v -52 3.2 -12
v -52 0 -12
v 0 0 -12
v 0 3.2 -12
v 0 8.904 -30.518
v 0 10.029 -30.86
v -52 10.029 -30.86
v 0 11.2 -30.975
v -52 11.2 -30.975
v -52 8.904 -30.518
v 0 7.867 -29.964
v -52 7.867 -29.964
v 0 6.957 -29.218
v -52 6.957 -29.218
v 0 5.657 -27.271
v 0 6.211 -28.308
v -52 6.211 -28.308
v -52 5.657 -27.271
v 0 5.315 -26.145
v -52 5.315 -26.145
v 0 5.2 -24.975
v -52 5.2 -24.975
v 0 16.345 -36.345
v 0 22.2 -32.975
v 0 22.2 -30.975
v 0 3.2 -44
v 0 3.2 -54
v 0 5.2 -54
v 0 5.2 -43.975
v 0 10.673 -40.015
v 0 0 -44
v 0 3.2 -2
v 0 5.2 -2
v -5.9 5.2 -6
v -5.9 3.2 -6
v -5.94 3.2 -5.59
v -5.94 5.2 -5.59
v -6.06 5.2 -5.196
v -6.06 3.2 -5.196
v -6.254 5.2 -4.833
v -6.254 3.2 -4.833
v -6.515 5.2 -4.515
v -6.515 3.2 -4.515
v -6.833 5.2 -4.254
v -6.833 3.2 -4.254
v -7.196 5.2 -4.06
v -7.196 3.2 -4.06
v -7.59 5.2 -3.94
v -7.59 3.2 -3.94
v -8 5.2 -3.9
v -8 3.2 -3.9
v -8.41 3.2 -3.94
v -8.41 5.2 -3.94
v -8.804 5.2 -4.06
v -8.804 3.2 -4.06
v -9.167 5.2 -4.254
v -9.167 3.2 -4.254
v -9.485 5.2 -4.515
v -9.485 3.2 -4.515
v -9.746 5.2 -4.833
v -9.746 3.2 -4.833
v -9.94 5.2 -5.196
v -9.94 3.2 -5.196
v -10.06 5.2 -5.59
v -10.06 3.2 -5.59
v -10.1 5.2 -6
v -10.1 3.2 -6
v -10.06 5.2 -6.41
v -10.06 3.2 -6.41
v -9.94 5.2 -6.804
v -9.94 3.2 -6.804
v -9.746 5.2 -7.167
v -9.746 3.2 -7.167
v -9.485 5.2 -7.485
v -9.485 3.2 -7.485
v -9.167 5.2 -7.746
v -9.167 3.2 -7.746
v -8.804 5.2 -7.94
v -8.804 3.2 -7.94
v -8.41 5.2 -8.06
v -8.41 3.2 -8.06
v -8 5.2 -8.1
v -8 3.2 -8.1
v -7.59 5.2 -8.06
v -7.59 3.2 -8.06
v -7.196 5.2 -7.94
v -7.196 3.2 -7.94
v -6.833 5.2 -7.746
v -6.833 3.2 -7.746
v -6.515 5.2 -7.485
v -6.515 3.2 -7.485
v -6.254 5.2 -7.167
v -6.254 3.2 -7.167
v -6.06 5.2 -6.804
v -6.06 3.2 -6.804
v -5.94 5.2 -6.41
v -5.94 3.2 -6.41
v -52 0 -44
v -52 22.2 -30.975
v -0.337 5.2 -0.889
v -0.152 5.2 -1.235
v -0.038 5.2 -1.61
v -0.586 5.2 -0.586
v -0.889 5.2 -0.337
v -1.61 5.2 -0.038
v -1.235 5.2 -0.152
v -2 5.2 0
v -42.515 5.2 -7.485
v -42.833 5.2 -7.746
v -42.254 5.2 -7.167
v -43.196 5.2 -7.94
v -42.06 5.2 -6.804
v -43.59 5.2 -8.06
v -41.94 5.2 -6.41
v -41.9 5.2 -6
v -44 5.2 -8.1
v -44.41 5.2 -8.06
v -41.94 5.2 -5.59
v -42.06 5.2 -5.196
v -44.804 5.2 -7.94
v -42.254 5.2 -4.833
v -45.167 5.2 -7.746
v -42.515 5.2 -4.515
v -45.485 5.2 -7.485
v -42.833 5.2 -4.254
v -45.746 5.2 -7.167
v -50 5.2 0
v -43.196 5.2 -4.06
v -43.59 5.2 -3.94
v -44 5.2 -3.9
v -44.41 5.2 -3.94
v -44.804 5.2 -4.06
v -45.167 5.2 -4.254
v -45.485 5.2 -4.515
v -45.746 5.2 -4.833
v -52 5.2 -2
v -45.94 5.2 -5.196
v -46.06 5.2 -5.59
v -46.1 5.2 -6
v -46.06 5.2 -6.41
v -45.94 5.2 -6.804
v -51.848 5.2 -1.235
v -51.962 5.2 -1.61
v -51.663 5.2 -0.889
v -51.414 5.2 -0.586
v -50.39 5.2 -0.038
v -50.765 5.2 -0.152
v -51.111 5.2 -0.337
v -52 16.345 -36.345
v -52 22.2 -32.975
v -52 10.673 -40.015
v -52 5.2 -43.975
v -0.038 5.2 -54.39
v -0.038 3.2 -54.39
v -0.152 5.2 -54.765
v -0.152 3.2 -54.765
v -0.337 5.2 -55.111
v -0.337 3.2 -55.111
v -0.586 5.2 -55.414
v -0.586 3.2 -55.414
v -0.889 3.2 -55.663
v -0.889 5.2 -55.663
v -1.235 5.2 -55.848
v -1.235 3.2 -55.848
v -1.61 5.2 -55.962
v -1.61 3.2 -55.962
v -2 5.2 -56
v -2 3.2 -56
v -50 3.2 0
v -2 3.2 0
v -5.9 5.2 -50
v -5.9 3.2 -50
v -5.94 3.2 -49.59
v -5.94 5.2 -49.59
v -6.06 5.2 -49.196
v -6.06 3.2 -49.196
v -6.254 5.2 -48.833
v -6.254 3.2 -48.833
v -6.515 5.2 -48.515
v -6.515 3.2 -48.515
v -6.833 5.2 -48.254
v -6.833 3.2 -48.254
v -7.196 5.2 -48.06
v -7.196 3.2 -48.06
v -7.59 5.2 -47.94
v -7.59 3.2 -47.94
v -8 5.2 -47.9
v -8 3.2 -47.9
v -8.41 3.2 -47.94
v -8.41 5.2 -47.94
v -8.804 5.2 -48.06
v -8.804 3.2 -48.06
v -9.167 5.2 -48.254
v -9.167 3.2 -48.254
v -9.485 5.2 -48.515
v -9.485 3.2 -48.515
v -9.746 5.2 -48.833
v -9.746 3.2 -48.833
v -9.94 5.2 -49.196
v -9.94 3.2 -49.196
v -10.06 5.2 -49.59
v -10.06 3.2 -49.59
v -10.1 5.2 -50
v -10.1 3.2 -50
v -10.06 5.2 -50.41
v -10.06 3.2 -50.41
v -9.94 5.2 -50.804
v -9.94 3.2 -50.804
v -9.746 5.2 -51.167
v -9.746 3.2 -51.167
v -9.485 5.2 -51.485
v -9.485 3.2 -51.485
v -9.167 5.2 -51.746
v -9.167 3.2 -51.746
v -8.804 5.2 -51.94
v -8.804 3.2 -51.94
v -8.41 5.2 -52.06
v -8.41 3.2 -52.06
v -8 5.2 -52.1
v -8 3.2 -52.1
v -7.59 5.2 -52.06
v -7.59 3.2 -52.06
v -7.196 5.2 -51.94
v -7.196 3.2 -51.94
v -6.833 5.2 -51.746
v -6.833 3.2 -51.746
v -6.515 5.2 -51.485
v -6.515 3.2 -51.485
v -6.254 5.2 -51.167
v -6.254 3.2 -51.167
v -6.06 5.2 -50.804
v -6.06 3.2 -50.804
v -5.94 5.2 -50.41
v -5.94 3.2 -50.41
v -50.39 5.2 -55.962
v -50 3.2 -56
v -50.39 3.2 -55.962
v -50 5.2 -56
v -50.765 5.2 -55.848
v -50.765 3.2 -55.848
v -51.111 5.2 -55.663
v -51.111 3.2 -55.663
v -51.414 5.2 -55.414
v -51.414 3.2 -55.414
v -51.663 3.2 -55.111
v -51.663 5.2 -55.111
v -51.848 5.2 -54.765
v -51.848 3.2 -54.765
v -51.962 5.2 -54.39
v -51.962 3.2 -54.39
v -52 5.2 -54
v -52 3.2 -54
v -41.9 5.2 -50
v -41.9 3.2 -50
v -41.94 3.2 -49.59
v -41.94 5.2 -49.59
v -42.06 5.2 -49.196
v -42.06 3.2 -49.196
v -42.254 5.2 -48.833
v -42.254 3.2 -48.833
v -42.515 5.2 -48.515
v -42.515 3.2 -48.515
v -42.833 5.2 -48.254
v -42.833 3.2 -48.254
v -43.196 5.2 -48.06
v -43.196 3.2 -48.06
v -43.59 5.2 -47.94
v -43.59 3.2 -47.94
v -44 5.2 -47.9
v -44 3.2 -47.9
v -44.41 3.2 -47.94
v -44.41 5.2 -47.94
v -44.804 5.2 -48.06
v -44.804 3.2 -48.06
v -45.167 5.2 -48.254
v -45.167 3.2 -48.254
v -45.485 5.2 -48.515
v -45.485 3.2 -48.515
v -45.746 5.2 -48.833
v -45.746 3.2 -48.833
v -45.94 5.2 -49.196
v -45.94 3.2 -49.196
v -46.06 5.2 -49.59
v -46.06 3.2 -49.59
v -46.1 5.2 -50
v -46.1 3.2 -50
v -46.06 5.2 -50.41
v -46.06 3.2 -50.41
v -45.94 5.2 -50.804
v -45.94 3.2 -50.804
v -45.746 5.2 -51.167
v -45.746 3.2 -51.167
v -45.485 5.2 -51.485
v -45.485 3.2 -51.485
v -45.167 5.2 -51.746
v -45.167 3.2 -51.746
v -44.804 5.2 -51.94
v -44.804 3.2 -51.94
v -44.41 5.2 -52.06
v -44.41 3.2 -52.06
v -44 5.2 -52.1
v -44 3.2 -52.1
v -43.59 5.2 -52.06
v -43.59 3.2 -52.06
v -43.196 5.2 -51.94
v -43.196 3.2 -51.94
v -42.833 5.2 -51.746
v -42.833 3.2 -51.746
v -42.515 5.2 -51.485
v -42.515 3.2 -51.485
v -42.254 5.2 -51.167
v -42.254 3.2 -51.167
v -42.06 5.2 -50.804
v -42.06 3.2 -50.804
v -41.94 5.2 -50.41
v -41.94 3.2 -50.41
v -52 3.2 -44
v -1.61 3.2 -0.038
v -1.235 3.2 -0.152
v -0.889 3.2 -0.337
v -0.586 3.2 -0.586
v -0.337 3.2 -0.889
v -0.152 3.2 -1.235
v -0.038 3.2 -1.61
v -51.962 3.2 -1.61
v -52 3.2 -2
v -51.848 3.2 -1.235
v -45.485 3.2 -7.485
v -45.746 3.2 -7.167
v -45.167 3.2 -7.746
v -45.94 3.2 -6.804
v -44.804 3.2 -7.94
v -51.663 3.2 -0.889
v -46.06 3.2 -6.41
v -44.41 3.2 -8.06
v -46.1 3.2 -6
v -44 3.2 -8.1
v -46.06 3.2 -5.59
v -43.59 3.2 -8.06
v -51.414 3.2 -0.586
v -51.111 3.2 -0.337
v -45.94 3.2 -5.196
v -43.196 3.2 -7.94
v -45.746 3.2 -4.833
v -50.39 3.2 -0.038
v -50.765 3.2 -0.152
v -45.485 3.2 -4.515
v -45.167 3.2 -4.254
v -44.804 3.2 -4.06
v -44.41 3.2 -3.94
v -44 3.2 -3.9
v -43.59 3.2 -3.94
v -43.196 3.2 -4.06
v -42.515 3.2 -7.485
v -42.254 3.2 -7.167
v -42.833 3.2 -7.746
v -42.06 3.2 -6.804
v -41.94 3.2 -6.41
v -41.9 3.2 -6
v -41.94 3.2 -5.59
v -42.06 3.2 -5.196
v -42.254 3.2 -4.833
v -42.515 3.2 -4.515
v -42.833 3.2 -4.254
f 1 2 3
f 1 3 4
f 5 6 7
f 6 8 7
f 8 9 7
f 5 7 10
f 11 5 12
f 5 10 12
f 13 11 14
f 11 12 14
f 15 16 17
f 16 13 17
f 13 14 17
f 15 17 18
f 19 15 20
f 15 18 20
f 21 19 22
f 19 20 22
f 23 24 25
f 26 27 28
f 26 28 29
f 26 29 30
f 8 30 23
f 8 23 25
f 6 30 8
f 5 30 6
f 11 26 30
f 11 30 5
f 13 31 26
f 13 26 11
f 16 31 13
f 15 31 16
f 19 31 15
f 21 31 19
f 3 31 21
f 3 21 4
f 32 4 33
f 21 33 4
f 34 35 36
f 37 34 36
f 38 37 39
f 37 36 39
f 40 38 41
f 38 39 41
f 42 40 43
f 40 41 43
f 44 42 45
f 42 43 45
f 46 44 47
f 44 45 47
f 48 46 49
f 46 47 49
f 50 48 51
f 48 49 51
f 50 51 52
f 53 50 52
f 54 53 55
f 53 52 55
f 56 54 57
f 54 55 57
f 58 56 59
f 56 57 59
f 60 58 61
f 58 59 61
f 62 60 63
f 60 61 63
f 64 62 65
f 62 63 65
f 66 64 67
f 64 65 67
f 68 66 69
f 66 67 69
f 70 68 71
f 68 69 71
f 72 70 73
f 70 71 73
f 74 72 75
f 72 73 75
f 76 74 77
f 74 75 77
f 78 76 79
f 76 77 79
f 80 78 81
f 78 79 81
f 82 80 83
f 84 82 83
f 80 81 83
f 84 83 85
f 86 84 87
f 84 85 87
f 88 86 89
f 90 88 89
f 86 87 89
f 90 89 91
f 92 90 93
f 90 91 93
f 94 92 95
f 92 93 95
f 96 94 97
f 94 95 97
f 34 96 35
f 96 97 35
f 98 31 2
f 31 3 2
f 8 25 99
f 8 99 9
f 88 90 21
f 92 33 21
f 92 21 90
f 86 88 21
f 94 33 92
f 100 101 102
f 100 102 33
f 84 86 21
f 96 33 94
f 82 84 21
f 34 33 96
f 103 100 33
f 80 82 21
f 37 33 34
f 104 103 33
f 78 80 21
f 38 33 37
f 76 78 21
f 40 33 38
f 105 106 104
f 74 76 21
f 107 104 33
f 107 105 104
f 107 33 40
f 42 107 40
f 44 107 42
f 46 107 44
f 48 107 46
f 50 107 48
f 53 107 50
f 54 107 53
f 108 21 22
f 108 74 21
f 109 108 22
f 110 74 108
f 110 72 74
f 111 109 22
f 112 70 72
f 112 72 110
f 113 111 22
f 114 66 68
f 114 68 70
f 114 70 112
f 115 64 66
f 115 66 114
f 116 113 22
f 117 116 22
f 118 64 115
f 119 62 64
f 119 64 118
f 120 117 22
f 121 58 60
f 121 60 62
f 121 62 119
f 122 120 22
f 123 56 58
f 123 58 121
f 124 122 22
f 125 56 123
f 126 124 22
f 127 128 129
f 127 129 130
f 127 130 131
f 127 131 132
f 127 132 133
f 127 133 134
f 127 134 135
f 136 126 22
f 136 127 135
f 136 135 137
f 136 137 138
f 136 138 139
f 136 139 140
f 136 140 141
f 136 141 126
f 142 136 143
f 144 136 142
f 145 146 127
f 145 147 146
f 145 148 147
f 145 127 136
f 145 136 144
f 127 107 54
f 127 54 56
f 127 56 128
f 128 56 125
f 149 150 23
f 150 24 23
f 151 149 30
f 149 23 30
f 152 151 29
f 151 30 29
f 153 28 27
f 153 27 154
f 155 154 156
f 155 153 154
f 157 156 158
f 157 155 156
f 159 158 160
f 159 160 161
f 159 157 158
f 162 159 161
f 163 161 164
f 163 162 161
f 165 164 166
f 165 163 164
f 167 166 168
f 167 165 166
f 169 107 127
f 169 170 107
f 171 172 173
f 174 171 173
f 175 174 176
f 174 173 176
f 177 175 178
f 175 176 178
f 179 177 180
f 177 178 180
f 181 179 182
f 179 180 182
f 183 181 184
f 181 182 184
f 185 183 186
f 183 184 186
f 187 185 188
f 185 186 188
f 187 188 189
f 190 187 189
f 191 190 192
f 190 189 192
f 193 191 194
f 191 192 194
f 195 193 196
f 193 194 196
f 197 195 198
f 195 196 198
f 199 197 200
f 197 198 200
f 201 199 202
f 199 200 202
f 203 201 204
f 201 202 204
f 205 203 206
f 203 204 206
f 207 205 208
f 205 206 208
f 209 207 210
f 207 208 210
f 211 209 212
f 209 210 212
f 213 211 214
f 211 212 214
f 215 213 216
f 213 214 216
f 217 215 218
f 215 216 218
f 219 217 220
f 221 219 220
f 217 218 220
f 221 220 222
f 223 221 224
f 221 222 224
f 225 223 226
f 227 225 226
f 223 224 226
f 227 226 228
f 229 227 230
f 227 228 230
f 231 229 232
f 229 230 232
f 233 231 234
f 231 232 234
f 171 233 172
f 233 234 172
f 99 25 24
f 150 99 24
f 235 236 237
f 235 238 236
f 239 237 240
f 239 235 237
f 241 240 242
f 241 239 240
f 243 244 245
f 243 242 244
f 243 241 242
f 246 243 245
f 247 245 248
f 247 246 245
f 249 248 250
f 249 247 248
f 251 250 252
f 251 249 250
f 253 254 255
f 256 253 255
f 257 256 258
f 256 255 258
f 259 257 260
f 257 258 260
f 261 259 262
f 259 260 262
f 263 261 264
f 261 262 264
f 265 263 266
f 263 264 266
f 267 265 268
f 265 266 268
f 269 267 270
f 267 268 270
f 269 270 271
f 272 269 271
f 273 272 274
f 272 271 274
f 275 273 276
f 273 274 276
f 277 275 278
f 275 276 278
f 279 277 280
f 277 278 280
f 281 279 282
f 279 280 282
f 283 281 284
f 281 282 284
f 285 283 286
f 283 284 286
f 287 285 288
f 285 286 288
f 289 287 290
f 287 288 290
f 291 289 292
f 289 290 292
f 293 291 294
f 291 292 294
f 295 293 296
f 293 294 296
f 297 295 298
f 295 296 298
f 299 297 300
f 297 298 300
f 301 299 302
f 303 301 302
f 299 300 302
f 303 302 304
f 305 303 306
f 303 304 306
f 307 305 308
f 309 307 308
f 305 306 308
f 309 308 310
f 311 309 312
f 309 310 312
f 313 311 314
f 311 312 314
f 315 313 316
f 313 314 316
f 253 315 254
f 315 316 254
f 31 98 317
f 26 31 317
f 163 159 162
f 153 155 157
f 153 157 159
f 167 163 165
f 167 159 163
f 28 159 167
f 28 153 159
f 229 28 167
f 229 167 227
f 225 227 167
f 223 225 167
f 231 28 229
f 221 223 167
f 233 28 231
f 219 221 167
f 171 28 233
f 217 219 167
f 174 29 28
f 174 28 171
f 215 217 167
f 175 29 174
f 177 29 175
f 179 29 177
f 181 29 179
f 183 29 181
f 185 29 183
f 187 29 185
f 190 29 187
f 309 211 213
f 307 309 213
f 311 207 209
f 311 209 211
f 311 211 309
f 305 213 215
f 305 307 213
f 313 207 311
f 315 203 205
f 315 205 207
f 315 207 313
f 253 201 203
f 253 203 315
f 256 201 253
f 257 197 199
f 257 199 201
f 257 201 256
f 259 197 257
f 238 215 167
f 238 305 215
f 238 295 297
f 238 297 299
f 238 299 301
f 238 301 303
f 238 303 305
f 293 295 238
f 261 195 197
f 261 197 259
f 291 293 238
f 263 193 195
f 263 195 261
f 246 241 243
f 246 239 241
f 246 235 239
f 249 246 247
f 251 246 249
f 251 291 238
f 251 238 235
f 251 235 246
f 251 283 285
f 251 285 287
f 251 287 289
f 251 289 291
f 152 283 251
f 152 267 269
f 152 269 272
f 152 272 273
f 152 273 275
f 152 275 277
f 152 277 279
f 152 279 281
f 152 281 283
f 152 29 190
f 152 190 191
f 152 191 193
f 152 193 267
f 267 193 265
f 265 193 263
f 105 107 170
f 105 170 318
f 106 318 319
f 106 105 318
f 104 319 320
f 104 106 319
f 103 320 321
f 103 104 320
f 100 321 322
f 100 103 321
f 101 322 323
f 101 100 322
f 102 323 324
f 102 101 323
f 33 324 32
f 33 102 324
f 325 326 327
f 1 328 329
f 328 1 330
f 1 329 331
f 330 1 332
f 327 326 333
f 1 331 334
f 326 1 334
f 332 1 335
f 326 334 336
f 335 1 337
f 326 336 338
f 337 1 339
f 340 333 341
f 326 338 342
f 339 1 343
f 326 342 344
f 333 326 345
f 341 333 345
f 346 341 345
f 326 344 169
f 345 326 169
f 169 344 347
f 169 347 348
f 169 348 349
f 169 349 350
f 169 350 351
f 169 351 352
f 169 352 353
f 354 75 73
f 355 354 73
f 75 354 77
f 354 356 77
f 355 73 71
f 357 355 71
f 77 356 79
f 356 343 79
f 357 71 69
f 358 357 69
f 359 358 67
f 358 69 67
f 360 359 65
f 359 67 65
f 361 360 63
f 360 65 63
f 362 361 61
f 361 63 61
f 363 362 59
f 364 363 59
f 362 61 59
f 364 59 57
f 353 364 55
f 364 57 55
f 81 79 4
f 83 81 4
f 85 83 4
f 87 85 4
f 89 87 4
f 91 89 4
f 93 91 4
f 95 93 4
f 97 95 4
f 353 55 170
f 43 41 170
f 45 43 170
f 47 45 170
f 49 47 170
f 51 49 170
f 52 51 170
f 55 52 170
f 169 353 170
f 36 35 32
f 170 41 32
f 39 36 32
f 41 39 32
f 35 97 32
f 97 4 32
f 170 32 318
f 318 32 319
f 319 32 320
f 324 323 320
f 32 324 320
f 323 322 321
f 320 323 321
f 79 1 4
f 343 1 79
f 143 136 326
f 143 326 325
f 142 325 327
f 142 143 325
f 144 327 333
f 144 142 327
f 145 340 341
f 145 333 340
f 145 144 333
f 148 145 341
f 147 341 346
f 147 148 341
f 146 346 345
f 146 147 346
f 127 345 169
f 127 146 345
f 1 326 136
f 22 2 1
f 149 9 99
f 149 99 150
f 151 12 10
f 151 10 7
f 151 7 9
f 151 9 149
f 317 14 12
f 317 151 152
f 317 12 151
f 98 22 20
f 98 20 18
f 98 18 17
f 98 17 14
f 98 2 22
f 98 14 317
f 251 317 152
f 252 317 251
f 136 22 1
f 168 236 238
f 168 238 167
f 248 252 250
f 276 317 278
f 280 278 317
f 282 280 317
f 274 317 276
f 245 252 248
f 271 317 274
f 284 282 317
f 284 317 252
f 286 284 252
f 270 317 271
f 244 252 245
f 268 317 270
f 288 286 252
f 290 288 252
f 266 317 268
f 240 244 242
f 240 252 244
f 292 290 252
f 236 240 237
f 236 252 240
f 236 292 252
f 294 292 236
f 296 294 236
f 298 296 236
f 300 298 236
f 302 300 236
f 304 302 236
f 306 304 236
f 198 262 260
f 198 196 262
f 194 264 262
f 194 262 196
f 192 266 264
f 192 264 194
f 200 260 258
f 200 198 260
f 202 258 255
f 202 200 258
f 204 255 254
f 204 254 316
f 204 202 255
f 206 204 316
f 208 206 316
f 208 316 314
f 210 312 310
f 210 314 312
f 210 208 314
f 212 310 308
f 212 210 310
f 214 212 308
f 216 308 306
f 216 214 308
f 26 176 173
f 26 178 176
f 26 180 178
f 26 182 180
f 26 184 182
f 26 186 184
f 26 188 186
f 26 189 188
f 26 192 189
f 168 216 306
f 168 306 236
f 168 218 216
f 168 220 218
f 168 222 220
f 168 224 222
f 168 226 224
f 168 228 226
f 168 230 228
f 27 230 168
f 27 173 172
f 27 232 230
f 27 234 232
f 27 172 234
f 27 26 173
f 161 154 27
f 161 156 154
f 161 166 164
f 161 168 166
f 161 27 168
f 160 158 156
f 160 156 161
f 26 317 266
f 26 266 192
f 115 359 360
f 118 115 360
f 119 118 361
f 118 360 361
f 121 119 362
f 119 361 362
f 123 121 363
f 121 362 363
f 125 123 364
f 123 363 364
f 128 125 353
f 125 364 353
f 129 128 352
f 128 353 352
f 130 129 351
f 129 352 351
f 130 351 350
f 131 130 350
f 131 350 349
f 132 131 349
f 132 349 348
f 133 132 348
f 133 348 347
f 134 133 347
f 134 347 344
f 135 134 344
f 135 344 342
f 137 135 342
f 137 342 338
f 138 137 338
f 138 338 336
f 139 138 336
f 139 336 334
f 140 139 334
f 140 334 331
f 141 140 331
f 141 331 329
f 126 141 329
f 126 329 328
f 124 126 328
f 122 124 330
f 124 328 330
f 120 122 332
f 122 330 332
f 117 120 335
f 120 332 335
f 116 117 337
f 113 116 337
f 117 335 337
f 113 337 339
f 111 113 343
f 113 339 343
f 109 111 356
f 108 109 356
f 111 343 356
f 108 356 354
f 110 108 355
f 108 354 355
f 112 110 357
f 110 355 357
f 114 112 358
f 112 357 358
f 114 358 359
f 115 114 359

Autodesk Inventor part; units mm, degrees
ref_plane "YZ Plane" through (0, 0, 0) normal (1, 0, 0) x (0, 1, 0)
ref_plane "XZ Plane" through (0, 0, 0) normal (0, 1, 0) x (-1, 0, 0)
ref_plane "XY Plane" through (0, 0, 0) normal (0, 0, 1) x (1, 0, 0)
sketch "Эскиз1" plane through (0, 0, 0) normal (0, 1, 0) x (-1, 0, 0)
  line L0 (0, 0) -> (52, 0)
  line L1 (52, 0) -> (52, -56)
  line L2 (52, -56) -> (0, -56)
  line L3 (0, -56) -> (0, 0)
  dimension "d0" = 56
  dimension "d9" = 52
extrude "Выдавливание1" add sketch "Эскиз1" along normal blind 5.2
sketch "Эскиз2" plane through (0, 0, 0) normal (1, 0, 0) x (0, 0, -1)
  line L0 (56, 0) -> (0, 0) projected
  line L1 (0, 0) -> (12, 0)
  line L2 (12, 0) -> (12, 3.2)
  line L3 (12, 3.2) -> (0, 3.2)
  line L4 (0, 3.2) -> (0, 0)
  line L5 (56, 0) -> (56, 5.2) projected
  line L6 (56, 0) -> (44, 0)
  line L7 (44, 0) -> (44, 3.2)
  line L8 (44, 3.2) -> (56, 3.2)
  line L9 (56, 3.2) -> (56, 0)
  dimension "d3" = 12
  dimension "d4" = 3.2
  dimension "d5" = 12
  dimension "d6" = 3.2
extrude "Выдавливание2" cut sketch "Эскиз2" against normal up to surface (52 mm away)
sketch "Эскиз3" plane through (0, 3.2, -12) normal (0, -1, 0) x (1, 0, 0)
  circle A0 centre (-8, 6) radius 2.1
  line L0 (0, 12) -> (0, 0) projected
  line L1 (-52, 12) -> (0, 12) projected
  circle A1 centre (-44, 6) radius 2.1
  line L2 (-52, 0) -> (-52, 12) projected
  circle A2 centre (-44, -38) radius 2.1
  line L3 (-52, -44) -> (-52, -32) projected
  line L4 (0, -44) -> (-52, -44) projected
  circle A3 centre (-8, -38) radius 2.1
  line L5 (0, -32) -> (0, -44) projected
  point P0 (0, 6)
  dimension "d10" = 4.2
  dimension "d11" = 8
  dimension "d12" = 6
  dimension "d13" = 4.2
  dimension "d14" = 6
  dimension "d15" = 8
  dimension "d16" = 4.2
  dimension "d17" = 8
  dimension "d18" = 6
  dimension "d19" = 4.2
  dimension "d20" = 8
  dimension "d21" = 6
extrude "Выдавливание3" cut sketch "Эскиз3" against normal blind 10
fillet "Сопряжение1" radius 2 4 edges at (0, 4.2, 0) (0, 4.2, -56) (-52, 4.2, -56) (-52, 4.2, 0)
sketch "Эскиз4" plane through (0, 0, -12) normal (1, 0, 0) x (0, 0, -1)
  line L0 (31.9749, 5.2) -> (18.9749, 5.2)
  line L1 (18.9749, 22.2) -> (18.9749, 5.2)
  line L2 (18.9749, 22.2) -> (20.9749, 22.2)
  arc A0 (20.9749, 22.2) -> (31.9749, 5.2) centre (135.2876, 84.1082) ccw
  point P0 (-12, 0)
  dimension "d26" = 13
  dimension "d34" = 2
  dimension "d35" = 130
extrude "Выдавливание4" add sketch "Эскиз4" against normal up to surface (52 mm away)
fillet "Сопряжение3" radius 6 1 edges at (-26, 5.2, -30.9749)
